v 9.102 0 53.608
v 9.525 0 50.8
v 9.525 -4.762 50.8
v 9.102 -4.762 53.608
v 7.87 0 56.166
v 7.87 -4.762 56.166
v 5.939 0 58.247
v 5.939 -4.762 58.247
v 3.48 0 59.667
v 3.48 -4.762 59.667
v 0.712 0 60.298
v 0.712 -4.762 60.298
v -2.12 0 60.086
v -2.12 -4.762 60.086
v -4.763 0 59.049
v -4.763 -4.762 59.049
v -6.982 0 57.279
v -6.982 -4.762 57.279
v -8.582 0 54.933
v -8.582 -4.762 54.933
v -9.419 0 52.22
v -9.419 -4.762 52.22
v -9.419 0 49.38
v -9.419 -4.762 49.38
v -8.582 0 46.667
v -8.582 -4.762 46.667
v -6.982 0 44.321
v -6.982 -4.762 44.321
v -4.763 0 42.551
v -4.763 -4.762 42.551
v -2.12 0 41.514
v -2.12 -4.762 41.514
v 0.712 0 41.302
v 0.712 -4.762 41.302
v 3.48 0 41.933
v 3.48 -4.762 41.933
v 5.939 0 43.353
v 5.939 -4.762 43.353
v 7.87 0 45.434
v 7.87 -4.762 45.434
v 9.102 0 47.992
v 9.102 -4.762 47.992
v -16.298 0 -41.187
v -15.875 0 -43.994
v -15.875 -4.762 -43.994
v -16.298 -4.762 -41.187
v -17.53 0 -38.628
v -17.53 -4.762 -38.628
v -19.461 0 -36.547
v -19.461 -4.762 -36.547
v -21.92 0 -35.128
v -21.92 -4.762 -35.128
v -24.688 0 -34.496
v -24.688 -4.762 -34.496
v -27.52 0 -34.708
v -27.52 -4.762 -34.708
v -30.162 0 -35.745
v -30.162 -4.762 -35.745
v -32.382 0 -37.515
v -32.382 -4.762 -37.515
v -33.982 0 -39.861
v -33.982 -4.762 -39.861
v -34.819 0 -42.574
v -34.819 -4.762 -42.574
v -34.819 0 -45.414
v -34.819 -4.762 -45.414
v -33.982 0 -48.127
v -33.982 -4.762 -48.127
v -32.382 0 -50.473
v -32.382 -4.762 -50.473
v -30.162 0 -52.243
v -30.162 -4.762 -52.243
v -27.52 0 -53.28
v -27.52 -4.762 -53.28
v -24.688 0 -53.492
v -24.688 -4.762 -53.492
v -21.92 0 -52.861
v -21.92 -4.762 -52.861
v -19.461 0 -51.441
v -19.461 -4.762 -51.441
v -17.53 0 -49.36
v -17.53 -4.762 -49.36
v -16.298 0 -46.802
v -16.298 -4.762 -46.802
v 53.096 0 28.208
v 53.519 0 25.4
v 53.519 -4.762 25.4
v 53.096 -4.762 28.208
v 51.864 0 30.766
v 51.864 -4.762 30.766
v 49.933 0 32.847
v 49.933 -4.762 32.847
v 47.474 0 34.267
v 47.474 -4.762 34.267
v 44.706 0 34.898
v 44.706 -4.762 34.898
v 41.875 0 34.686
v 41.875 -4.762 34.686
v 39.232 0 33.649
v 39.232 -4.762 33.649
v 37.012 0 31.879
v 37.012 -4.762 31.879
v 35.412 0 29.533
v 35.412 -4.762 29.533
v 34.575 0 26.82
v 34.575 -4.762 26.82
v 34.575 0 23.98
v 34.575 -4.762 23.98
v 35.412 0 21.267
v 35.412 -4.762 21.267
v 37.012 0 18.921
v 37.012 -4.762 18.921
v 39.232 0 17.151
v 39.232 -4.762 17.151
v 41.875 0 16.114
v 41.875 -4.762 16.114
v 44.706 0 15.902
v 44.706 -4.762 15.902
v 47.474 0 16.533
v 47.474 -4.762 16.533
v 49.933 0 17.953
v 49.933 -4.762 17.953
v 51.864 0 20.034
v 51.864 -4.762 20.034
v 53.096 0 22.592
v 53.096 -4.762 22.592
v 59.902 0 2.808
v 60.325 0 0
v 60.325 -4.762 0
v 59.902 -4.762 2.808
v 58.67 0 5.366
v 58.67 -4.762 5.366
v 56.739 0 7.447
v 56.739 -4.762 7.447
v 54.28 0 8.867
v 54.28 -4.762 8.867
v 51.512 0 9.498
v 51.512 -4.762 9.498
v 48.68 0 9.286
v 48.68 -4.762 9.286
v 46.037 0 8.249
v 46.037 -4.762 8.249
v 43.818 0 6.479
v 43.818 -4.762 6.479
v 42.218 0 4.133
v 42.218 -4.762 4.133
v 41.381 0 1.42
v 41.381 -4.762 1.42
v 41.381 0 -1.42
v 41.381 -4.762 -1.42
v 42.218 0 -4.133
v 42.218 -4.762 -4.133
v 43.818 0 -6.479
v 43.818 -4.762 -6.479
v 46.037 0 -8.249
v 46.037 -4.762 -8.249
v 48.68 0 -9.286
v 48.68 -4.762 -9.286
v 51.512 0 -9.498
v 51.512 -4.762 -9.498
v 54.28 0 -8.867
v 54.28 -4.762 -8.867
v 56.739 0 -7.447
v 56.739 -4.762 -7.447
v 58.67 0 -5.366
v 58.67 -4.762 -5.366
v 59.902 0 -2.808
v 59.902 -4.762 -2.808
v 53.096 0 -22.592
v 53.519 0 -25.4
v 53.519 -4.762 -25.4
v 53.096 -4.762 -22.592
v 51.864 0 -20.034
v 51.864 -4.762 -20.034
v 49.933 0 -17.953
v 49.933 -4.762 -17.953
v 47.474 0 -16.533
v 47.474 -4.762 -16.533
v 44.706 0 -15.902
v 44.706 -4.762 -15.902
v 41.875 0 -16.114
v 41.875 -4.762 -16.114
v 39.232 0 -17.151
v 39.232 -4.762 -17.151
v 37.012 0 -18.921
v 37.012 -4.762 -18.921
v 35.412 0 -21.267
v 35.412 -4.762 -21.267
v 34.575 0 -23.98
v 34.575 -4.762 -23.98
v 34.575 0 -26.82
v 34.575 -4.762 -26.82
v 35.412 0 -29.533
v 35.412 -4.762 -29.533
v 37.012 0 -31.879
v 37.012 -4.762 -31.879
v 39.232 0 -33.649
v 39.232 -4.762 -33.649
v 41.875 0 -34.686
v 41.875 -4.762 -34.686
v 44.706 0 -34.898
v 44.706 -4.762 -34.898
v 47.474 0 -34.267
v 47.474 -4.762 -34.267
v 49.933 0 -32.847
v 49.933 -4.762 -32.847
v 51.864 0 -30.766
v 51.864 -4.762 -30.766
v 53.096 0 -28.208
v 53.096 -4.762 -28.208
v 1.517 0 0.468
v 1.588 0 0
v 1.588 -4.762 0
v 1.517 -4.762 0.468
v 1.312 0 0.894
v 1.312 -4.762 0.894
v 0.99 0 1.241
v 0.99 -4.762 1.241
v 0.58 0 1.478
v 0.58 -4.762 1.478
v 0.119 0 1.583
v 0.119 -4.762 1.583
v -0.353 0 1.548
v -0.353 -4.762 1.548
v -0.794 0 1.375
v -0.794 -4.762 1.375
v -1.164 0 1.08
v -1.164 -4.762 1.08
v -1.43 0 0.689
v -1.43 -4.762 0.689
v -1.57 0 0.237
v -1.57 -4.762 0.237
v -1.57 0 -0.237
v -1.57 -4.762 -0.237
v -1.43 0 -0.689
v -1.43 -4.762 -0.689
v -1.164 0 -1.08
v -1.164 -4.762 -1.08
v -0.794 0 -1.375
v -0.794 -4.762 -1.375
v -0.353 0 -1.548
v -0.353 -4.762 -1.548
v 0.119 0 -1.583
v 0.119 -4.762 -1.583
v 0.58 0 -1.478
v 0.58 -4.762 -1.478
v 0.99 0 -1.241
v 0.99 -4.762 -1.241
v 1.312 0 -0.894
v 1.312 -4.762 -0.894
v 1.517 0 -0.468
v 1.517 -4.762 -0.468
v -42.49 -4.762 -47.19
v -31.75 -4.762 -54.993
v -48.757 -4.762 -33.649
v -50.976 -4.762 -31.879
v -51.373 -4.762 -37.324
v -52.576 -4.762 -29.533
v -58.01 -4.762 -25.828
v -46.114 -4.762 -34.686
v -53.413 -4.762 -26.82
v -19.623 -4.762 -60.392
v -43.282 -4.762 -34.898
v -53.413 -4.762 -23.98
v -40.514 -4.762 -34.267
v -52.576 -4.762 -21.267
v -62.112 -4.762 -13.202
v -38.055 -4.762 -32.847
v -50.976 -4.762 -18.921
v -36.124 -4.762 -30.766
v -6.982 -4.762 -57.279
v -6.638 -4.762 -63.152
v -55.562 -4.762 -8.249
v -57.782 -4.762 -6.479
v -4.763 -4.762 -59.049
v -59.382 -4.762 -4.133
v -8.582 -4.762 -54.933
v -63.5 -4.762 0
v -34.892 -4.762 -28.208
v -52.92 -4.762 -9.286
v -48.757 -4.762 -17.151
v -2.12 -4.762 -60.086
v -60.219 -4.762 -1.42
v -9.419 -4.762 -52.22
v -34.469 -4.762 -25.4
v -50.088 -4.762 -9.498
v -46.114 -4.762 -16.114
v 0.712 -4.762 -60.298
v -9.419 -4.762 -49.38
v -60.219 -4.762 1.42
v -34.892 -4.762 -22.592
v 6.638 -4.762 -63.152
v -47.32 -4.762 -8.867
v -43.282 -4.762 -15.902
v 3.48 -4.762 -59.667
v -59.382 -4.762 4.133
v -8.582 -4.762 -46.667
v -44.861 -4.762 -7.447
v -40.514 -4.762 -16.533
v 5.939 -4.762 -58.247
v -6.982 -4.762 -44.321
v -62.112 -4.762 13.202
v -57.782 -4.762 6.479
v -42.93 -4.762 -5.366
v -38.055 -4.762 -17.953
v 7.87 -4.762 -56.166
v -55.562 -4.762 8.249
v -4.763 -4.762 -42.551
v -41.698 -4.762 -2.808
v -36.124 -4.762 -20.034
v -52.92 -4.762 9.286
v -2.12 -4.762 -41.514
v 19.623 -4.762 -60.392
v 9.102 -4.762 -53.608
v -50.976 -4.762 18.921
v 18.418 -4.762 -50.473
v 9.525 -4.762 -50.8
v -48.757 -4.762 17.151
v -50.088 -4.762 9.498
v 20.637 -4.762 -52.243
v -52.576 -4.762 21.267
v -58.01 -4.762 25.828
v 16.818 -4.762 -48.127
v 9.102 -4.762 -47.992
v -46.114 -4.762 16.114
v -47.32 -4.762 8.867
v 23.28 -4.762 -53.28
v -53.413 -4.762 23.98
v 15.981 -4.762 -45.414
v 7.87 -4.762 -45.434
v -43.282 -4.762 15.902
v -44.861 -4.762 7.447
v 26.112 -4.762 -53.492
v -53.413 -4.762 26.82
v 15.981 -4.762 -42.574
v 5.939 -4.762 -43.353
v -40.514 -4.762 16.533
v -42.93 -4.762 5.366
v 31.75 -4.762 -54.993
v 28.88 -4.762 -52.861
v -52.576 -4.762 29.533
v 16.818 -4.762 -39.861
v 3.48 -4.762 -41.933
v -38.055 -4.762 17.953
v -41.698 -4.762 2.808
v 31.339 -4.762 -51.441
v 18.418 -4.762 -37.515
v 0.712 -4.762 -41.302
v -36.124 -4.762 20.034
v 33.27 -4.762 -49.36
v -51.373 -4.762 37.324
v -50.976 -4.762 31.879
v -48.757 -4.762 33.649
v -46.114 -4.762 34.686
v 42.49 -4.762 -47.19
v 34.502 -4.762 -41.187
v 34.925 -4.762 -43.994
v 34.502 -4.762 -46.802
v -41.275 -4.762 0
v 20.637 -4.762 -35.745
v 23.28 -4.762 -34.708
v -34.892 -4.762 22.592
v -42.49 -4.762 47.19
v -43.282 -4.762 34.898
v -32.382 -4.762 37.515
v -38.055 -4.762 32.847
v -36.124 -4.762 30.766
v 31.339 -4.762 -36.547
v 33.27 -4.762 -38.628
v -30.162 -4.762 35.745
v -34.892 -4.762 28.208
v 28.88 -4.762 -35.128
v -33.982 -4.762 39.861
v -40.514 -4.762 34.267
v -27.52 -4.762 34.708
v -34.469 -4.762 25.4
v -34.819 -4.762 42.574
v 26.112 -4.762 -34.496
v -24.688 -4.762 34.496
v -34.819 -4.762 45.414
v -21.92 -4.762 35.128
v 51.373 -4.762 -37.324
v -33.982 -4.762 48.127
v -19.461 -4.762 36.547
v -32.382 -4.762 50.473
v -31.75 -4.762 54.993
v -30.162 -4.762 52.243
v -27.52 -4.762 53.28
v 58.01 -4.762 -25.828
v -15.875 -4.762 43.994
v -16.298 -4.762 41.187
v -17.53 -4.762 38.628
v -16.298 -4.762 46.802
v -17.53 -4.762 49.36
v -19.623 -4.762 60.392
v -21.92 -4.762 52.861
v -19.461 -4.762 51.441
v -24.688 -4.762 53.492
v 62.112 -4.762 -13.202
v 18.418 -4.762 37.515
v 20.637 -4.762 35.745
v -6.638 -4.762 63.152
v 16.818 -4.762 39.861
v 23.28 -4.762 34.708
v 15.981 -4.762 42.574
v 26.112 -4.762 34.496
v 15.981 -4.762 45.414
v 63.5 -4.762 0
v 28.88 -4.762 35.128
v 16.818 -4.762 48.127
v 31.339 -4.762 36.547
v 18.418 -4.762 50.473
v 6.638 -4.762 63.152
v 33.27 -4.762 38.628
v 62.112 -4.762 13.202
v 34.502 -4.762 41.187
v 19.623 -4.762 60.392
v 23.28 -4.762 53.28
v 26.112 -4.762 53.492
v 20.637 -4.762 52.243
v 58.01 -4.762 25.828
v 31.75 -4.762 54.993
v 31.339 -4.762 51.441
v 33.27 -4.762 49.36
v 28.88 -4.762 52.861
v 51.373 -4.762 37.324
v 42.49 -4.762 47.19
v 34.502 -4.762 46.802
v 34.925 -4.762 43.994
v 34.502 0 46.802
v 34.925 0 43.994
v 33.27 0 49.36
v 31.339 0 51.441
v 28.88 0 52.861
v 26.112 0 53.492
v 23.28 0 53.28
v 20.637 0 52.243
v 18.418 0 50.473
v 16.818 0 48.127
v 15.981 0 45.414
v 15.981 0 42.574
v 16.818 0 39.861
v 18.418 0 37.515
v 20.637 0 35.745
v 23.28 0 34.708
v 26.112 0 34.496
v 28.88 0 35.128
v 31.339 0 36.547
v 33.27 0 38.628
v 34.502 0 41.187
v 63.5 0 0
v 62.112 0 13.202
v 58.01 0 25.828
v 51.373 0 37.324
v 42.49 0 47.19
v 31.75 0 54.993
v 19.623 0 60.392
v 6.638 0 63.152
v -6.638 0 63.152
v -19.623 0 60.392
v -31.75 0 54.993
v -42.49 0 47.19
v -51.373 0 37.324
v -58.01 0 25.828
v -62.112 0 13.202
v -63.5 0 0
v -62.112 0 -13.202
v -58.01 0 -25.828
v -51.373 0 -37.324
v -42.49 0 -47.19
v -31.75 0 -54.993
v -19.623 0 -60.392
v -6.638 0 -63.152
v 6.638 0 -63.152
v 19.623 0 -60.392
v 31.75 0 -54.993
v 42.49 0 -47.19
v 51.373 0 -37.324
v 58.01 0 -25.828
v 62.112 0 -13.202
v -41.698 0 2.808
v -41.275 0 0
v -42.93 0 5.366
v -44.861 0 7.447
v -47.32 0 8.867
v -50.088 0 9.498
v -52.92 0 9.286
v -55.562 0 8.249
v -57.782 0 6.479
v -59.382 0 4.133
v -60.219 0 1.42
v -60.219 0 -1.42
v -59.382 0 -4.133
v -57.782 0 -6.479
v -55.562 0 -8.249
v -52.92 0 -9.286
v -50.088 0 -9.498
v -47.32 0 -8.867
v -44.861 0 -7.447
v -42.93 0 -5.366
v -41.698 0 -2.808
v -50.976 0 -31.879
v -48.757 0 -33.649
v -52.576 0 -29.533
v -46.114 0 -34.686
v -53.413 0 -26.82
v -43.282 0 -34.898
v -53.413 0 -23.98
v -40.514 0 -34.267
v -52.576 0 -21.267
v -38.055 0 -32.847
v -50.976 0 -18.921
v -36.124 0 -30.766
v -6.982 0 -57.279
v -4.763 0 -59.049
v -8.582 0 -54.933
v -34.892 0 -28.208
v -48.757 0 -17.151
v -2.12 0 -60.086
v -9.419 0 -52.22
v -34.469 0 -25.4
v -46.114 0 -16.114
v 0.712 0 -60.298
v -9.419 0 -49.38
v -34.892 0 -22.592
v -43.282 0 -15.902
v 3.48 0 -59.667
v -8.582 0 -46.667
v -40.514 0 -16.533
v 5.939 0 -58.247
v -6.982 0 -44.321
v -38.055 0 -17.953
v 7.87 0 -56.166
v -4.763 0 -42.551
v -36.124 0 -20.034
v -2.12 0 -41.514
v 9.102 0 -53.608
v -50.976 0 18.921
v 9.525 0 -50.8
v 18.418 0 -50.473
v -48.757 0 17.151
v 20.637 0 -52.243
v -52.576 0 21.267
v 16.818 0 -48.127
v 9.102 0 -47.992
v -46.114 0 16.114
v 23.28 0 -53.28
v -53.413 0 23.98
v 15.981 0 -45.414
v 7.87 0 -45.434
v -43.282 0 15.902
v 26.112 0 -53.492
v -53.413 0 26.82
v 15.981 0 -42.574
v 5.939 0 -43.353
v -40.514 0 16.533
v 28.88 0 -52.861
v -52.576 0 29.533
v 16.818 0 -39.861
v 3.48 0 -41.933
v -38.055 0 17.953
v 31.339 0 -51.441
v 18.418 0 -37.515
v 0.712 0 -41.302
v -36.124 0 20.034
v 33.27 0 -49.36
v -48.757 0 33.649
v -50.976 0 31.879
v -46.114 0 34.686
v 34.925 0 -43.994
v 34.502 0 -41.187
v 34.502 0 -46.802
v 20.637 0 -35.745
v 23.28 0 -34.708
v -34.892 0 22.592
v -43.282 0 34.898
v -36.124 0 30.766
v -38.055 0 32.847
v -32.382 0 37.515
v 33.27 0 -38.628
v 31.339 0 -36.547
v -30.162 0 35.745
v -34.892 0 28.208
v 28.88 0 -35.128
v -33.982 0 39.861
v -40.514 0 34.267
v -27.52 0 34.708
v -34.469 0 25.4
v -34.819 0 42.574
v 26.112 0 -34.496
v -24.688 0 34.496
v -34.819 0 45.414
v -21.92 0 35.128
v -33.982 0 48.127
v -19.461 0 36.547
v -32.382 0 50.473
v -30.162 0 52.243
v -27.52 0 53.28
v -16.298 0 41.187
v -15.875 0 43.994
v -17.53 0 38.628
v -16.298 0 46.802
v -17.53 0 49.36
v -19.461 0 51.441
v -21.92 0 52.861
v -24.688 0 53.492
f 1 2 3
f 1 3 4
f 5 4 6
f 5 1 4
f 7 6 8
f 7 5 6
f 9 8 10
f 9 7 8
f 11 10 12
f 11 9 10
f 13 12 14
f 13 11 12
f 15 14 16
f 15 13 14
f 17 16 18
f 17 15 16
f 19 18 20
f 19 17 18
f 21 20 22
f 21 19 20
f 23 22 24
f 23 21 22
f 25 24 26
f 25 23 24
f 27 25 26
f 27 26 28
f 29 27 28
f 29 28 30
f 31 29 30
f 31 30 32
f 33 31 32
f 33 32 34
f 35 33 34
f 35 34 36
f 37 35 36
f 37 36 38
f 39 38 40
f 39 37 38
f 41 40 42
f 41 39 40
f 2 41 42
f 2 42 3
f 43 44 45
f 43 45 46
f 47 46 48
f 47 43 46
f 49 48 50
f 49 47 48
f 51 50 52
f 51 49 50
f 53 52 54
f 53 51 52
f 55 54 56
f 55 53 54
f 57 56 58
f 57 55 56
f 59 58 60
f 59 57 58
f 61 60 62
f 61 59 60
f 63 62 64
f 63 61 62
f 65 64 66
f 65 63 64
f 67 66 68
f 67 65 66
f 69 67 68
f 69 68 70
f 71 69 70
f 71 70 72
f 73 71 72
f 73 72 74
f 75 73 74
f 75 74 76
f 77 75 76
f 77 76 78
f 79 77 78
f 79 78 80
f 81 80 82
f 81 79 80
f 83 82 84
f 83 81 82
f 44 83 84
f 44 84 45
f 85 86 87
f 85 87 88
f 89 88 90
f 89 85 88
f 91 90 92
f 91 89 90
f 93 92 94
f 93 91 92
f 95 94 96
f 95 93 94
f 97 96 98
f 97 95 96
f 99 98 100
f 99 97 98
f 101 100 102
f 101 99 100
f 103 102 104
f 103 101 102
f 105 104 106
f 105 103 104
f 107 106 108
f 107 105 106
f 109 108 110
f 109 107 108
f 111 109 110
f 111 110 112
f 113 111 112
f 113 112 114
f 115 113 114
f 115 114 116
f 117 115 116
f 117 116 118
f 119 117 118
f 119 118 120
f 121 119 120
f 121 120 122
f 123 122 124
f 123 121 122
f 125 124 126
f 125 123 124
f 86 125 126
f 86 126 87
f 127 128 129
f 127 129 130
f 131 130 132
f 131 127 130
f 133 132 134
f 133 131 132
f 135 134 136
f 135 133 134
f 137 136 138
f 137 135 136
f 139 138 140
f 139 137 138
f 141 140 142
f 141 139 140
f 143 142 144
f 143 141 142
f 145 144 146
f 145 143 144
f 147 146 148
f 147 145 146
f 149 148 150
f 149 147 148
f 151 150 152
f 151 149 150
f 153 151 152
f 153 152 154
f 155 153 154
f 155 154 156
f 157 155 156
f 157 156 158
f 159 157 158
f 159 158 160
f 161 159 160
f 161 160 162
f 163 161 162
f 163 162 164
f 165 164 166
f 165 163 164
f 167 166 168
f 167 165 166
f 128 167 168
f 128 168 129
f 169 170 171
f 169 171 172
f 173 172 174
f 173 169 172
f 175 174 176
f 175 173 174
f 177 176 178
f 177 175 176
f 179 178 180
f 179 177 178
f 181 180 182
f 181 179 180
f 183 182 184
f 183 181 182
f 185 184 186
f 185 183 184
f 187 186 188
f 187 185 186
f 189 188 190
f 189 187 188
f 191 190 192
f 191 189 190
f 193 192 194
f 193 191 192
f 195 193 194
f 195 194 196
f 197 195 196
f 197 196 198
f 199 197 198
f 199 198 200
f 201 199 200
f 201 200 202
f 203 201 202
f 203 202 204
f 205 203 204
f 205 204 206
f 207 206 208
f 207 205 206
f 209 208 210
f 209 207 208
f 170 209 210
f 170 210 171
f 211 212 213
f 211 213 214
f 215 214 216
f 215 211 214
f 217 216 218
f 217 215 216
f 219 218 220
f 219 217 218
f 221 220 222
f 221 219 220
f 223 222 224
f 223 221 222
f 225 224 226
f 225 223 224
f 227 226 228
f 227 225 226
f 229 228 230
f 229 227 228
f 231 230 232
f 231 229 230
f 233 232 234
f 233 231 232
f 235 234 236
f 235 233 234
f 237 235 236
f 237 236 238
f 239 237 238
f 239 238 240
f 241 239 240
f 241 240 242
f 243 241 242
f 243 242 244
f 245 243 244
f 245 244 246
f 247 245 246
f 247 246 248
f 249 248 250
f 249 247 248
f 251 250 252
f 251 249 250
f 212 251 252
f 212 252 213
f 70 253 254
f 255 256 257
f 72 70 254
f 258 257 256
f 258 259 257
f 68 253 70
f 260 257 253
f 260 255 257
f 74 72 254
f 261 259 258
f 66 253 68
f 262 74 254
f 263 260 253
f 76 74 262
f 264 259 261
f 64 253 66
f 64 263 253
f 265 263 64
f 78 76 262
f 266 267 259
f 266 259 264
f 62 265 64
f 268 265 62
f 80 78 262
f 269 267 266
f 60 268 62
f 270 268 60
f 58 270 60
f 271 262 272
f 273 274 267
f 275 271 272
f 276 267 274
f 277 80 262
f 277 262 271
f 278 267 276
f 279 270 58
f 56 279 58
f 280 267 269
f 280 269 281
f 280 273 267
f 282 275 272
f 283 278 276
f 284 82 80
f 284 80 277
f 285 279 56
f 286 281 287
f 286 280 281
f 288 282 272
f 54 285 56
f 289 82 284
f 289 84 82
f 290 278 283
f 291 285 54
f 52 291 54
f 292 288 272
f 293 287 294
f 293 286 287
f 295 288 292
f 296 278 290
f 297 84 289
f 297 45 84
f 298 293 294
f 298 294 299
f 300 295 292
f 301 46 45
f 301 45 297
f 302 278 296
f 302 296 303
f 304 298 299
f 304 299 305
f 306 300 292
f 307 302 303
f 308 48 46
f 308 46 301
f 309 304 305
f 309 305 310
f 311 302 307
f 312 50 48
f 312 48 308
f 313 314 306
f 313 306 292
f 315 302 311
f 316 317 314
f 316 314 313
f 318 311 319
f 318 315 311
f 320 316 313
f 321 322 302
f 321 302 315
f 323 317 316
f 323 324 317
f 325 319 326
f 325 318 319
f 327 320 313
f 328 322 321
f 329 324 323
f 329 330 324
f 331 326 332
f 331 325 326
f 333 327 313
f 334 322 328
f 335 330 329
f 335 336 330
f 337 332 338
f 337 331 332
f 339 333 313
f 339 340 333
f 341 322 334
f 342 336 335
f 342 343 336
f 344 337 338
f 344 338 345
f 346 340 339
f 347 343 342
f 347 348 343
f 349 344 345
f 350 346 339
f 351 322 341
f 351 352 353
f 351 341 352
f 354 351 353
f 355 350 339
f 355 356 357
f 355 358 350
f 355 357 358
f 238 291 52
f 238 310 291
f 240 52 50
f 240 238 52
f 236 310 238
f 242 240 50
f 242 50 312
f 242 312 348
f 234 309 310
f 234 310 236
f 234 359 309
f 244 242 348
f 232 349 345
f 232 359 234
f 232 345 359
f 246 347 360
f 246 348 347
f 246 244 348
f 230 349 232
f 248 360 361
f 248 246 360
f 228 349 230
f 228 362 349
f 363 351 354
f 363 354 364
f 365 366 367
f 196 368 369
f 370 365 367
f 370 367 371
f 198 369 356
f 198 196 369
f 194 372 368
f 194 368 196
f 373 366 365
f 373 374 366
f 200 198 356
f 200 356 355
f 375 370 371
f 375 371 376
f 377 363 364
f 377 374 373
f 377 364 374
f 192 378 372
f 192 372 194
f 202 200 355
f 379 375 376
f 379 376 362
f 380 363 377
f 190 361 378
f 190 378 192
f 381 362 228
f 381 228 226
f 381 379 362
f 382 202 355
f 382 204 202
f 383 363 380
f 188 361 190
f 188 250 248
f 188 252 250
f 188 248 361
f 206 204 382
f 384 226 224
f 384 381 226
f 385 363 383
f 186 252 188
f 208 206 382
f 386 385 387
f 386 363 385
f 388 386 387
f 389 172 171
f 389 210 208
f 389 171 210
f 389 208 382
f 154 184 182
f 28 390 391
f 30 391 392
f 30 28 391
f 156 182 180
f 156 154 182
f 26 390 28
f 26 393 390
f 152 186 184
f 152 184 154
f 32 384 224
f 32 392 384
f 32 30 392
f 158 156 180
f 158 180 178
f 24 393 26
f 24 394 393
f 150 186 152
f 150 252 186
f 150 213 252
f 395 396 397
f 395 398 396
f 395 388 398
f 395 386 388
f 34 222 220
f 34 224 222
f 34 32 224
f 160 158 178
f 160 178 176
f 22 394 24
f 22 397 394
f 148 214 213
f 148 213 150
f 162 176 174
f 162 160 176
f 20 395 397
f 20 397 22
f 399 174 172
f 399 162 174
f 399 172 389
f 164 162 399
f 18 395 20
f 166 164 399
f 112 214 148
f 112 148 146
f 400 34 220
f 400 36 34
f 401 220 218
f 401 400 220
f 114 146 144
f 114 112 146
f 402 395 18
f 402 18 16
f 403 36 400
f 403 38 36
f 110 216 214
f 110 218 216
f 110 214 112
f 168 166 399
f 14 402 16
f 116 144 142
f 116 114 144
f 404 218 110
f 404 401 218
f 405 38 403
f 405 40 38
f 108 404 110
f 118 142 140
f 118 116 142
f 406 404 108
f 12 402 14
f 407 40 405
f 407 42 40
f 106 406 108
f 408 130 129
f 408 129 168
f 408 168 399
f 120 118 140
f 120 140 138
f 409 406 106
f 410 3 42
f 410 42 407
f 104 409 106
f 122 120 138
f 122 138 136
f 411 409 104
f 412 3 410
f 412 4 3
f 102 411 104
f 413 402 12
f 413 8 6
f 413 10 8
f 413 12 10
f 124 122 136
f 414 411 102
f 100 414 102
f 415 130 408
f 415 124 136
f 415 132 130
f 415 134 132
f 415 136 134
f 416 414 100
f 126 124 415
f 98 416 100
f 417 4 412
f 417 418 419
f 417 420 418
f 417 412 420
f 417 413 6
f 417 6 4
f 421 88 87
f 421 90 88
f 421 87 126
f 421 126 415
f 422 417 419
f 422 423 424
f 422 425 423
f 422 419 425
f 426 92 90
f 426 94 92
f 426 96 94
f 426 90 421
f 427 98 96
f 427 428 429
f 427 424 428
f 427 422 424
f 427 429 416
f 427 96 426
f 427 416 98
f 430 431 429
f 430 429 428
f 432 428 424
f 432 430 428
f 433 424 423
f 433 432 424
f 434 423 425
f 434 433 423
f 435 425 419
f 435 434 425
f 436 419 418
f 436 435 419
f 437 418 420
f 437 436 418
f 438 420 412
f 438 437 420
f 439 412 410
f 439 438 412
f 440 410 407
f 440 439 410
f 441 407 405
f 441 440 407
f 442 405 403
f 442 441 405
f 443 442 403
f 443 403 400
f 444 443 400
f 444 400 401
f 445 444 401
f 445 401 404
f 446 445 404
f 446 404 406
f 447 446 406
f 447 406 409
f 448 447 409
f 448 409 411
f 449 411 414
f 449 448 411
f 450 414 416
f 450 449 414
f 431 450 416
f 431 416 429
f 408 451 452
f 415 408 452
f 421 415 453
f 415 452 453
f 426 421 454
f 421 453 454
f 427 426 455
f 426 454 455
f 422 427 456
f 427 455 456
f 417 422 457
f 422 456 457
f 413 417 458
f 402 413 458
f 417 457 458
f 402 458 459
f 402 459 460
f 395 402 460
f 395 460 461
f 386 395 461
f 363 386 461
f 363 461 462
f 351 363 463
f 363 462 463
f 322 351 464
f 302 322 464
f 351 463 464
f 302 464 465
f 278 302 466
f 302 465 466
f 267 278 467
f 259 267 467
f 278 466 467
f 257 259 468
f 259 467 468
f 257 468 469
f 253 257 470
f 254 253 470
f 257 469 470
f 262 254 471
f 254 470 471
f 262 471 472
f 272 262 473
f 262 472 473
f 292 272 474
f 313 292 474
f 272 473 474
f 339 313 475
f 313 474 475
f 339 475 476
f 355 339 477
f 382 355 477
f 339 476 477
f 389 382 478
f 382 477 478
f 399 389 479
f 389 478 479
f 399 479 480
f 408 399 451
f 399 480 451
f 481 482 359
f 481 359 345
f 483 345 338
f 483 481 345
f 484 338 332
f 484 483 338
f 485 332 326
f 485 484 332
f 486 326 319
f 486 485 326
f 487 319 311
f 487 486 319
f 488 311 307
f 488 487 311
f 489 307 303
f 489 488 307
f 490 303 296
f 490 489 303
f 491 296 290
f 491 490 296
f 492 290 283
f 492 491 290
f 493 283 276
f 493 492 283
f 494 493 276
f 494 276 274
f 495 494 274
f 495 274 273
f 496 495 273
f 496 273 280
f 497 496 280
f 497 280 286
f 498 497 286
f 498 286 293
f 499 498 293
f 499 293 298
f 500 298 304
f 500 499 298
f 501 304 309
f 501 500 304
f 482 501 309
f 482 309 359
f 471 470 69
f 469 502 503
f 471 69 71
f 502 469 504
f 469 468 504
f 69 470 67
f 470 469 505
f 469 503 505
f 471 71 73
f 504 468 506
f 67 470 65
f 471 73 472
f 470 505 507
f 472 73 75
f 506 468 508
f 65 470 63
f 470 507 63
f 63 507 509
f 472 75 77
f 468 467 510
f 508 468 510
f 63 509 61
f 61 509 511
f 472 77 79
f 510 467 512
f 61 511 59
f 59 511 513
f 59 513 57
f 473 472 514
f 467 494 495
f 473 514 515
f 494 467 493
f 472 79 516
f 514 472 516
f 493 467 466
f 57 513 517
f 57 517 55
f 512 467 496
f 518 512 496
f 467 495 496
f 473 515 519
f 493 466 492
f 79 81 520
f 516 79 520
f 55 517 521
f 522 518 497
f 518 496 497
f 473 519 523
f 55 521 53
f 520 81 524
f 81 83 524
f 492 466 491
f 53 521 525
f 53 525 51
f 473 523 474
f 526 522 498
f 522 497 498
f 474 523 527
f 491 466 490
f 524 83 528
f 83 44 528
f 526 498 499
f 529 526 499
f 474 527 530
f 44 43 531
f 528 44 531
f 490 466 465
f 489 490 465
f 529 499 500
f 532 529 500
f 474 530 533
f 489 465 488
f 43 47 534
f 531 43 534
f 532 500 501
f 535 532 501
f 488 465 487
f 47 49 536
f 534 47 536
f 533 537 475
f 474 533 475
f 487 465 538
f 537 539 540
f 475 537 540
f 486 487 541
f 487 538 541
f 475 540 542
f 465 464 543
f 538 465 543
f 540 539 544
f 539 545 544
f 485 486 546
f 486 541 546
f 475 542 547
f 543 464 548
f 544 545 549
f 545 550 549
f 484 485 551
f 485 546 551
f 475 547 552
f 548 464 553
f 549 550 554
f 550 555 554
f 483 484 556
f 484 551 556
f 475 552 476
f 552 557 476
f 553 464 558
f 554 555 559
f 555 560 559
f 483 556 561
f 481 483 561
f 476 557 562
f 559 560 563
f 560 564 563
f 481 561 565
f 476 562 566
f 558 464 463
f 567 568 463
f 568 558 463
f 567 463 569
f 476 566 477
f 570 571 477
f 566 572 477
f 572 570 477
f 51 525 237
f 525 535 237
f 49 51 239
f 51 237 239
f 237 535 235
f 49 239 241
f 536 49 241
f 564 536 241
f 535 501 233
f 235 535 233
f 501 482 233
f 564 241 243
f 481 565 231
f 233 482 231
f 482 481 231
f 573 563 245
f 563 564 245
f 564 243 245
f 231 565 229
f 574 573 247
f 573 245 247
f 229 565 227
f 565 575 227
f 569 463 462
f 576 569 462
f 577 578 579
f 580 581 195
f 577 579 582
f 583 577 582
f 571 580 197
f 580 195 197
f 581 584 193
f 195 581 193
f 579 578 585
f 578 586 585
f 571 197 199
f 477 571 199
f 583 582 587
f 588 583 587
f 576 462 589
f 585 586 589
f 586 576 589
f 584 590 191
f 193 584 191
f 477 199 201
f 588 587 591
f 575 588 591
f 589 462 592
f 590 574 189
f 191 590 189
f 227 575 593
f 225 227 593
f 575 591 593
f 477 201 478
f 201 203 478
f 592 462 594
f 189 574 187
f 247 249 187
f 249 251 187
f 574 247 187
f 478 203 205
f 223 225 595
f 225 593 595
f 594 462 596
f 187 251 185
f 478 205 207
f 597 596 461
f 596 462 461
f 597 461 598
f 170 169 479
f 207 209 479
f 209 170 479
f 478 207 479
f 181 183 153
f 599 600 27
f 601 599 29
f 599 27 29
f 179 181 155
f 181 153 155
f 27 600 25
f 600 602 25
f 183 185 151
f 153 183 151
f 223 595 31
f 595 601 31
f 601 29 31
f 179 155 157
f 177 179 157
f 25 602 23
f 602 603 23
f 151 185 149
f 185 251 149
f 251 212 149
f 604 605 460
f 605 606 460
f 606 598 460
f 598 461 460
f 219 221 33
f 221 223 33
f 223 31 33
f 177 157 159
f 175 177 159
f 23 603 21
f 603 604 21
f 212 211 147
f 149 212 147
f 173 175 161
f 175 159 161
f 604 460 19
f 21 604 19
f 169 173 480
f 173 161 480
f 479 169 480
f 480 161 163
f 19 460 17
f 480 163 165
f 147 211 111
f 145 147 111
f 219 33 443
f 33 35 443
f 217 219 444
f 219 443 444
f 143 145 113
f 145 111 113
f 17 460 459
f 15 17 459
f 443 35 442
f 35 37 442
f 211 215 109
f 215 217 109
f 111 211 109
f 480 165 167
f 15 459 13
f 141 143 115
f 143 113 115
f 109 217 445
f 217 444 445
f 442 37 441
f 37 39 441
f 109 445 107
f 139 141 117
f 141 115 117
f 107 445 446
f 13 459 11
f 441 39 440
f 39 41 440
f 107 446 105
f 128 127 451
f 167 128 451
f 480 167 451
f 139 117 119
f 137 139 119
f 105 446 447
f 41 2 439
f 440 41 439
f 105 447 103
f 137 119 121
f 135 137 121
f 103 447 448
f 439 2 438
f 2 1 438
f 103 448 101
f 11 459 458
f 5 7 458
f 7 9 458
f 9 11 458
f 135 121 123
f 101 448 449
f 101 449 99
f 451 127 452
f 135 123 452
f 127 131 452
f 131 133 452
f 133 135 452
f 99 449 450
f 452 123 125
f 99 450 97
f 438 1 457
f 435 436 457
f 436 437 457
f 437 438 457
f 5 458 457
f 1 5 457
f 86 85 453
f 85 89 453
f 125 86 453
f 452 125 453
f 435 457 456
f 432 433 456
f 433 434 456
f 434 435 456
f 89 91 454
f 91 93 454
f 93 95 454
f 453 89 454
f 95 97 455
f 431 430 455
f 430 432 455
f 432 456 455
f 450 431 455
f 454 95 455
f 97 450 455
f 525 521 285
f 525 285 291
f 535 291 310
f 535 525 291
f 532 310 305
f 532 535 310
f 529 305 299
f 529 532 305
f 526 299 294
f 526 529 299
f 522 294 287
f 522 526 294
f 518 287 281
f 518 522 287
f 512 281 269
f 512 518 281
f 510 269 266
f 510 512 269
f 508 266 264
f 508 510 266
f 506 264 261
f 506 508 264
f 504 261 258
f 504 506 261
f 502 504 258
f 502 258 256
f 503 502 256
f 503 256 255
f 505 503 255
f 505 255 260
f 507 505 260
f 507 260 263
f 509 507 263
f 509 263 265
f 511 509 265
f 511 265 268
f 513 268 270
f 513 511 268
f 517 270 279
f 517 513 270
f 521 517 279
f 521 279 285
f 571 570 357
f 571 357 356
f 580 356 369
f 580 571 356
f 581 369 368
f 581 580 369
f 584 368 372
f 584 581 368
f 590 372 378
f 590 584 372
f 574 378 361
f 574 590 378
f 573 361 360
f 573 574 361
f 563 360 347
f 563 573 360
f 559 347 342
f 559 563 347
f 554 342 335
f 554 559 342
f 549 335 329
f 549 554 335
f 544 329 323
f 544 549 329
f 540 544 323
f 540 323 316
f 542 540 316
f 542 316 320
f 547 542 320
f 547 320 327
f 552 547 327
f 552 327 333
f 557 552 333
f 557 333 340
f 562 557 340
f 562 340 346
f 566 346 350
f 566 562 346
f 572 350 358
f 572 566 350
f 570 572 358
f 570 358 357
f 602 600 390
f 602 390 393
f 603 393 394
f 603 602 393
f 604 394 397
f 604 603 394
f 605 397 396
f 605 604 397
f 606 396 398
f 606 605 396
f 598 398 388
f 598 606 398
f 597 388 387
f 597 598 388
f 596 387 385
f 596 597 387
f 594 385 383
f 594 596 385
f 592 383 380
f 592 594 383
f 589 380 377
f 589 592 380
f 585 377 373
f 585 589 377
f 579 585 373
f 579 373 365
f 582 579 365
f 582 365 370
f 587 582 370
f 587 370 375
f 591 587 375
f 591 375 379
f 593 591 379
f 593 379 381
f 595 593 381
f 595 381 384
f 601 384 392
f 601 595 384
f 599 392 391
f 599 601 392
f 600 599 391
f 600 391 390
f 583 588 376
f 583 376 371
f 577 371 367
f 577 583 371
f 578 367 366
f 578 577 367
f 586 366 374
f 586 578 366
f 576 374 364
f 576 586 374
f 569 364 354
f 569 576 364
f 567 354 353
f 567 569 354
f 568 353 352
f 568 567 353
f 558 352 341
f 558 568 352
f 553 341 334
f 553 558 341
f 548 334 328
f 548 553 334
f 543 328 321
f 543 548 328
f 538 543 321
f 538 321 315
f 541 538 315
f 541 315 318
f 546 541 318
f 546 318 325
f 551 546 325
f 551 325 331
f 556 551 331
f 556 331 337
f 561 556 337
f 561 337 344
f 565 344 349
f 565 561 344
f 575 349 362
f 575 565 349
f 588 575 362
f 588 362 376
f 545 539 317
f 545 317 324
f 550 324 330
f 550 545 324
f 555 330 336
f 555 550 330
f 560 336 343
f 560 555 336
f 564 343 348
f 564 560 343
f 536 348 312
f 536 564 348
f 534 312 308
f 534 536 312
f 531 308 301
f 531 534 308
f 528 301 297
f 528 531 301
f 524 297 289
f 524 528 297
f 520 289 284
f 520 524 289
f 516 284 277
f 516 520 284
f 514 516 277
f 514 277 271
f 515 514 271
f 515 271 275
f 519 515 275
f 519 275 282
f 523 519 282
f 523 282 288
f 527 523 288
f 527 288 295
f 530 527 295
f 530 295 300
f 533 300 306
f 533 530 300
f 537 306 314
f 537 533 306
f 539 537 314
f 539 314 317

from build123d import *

# Parameters (mm, degrees)
F0_R     = 63.5
F0_R_2   = 9.525
F0_R_3   = 1.5875
F1_DEPTH = 4.7625


with BuildPart() as f1:
    # F0 (on Front) → F1 (new body)
    with BuildSketch(Plane.XZ):
        Circle(F0_R)
        with Locations((-25.4, -43.994091)):
            Circle(F0_R_2, mode=Mode.SUBTRACT)
        with Locations((-43.994091, -25.4)):
            Circle(F0_R_2, mode=Mode.SUBTRACT)
        with Locations((0, -50.8)):
            Circle(F0_R_2, mode=Mode.SUBTRACT)
        with Locations((25.4, -43.994091)):
            Circle(F0_R_2, mode=Mode.SUBTRACT)
        with Locations((43.994091, -25.4)):
            Circle(F0_R_2, mode=Mode.SUBTRACT)
        with Locations((-50.8, 0)):
            Circle(F0_R_2, mode=Mode.SUBTRACT)
        with Locations((-43.994091, 25.4)):
            Circle(F0_R_2, mode=Mode.SUBTRACT)
        with Locations((-25.4, 43.994091)):
            Circle(F0_R_2, mode=Mode.SUBTRACT)
        Circle(F0_R_3, mode=Mode.SUBTRACT)
        with Locations((50.8, 0)):
            Circle(F0_R_2, mode=Mode.SUBTRACT)
        with Locations((43.994091, 25.4)):
            Circle(F0_R_2, mode=Mode.SUBTRACT)
        with Locations((25.4, 43.994091)):
            Circle(F0_R_2, mode=Mode.SUBTRACT)
        with Locations((0, 50.8)):
            Circle(F0_R_2, mode=Mode.SUBTRACT)
    extrude(amount=F1_DEPTH)


solid = f1.part
